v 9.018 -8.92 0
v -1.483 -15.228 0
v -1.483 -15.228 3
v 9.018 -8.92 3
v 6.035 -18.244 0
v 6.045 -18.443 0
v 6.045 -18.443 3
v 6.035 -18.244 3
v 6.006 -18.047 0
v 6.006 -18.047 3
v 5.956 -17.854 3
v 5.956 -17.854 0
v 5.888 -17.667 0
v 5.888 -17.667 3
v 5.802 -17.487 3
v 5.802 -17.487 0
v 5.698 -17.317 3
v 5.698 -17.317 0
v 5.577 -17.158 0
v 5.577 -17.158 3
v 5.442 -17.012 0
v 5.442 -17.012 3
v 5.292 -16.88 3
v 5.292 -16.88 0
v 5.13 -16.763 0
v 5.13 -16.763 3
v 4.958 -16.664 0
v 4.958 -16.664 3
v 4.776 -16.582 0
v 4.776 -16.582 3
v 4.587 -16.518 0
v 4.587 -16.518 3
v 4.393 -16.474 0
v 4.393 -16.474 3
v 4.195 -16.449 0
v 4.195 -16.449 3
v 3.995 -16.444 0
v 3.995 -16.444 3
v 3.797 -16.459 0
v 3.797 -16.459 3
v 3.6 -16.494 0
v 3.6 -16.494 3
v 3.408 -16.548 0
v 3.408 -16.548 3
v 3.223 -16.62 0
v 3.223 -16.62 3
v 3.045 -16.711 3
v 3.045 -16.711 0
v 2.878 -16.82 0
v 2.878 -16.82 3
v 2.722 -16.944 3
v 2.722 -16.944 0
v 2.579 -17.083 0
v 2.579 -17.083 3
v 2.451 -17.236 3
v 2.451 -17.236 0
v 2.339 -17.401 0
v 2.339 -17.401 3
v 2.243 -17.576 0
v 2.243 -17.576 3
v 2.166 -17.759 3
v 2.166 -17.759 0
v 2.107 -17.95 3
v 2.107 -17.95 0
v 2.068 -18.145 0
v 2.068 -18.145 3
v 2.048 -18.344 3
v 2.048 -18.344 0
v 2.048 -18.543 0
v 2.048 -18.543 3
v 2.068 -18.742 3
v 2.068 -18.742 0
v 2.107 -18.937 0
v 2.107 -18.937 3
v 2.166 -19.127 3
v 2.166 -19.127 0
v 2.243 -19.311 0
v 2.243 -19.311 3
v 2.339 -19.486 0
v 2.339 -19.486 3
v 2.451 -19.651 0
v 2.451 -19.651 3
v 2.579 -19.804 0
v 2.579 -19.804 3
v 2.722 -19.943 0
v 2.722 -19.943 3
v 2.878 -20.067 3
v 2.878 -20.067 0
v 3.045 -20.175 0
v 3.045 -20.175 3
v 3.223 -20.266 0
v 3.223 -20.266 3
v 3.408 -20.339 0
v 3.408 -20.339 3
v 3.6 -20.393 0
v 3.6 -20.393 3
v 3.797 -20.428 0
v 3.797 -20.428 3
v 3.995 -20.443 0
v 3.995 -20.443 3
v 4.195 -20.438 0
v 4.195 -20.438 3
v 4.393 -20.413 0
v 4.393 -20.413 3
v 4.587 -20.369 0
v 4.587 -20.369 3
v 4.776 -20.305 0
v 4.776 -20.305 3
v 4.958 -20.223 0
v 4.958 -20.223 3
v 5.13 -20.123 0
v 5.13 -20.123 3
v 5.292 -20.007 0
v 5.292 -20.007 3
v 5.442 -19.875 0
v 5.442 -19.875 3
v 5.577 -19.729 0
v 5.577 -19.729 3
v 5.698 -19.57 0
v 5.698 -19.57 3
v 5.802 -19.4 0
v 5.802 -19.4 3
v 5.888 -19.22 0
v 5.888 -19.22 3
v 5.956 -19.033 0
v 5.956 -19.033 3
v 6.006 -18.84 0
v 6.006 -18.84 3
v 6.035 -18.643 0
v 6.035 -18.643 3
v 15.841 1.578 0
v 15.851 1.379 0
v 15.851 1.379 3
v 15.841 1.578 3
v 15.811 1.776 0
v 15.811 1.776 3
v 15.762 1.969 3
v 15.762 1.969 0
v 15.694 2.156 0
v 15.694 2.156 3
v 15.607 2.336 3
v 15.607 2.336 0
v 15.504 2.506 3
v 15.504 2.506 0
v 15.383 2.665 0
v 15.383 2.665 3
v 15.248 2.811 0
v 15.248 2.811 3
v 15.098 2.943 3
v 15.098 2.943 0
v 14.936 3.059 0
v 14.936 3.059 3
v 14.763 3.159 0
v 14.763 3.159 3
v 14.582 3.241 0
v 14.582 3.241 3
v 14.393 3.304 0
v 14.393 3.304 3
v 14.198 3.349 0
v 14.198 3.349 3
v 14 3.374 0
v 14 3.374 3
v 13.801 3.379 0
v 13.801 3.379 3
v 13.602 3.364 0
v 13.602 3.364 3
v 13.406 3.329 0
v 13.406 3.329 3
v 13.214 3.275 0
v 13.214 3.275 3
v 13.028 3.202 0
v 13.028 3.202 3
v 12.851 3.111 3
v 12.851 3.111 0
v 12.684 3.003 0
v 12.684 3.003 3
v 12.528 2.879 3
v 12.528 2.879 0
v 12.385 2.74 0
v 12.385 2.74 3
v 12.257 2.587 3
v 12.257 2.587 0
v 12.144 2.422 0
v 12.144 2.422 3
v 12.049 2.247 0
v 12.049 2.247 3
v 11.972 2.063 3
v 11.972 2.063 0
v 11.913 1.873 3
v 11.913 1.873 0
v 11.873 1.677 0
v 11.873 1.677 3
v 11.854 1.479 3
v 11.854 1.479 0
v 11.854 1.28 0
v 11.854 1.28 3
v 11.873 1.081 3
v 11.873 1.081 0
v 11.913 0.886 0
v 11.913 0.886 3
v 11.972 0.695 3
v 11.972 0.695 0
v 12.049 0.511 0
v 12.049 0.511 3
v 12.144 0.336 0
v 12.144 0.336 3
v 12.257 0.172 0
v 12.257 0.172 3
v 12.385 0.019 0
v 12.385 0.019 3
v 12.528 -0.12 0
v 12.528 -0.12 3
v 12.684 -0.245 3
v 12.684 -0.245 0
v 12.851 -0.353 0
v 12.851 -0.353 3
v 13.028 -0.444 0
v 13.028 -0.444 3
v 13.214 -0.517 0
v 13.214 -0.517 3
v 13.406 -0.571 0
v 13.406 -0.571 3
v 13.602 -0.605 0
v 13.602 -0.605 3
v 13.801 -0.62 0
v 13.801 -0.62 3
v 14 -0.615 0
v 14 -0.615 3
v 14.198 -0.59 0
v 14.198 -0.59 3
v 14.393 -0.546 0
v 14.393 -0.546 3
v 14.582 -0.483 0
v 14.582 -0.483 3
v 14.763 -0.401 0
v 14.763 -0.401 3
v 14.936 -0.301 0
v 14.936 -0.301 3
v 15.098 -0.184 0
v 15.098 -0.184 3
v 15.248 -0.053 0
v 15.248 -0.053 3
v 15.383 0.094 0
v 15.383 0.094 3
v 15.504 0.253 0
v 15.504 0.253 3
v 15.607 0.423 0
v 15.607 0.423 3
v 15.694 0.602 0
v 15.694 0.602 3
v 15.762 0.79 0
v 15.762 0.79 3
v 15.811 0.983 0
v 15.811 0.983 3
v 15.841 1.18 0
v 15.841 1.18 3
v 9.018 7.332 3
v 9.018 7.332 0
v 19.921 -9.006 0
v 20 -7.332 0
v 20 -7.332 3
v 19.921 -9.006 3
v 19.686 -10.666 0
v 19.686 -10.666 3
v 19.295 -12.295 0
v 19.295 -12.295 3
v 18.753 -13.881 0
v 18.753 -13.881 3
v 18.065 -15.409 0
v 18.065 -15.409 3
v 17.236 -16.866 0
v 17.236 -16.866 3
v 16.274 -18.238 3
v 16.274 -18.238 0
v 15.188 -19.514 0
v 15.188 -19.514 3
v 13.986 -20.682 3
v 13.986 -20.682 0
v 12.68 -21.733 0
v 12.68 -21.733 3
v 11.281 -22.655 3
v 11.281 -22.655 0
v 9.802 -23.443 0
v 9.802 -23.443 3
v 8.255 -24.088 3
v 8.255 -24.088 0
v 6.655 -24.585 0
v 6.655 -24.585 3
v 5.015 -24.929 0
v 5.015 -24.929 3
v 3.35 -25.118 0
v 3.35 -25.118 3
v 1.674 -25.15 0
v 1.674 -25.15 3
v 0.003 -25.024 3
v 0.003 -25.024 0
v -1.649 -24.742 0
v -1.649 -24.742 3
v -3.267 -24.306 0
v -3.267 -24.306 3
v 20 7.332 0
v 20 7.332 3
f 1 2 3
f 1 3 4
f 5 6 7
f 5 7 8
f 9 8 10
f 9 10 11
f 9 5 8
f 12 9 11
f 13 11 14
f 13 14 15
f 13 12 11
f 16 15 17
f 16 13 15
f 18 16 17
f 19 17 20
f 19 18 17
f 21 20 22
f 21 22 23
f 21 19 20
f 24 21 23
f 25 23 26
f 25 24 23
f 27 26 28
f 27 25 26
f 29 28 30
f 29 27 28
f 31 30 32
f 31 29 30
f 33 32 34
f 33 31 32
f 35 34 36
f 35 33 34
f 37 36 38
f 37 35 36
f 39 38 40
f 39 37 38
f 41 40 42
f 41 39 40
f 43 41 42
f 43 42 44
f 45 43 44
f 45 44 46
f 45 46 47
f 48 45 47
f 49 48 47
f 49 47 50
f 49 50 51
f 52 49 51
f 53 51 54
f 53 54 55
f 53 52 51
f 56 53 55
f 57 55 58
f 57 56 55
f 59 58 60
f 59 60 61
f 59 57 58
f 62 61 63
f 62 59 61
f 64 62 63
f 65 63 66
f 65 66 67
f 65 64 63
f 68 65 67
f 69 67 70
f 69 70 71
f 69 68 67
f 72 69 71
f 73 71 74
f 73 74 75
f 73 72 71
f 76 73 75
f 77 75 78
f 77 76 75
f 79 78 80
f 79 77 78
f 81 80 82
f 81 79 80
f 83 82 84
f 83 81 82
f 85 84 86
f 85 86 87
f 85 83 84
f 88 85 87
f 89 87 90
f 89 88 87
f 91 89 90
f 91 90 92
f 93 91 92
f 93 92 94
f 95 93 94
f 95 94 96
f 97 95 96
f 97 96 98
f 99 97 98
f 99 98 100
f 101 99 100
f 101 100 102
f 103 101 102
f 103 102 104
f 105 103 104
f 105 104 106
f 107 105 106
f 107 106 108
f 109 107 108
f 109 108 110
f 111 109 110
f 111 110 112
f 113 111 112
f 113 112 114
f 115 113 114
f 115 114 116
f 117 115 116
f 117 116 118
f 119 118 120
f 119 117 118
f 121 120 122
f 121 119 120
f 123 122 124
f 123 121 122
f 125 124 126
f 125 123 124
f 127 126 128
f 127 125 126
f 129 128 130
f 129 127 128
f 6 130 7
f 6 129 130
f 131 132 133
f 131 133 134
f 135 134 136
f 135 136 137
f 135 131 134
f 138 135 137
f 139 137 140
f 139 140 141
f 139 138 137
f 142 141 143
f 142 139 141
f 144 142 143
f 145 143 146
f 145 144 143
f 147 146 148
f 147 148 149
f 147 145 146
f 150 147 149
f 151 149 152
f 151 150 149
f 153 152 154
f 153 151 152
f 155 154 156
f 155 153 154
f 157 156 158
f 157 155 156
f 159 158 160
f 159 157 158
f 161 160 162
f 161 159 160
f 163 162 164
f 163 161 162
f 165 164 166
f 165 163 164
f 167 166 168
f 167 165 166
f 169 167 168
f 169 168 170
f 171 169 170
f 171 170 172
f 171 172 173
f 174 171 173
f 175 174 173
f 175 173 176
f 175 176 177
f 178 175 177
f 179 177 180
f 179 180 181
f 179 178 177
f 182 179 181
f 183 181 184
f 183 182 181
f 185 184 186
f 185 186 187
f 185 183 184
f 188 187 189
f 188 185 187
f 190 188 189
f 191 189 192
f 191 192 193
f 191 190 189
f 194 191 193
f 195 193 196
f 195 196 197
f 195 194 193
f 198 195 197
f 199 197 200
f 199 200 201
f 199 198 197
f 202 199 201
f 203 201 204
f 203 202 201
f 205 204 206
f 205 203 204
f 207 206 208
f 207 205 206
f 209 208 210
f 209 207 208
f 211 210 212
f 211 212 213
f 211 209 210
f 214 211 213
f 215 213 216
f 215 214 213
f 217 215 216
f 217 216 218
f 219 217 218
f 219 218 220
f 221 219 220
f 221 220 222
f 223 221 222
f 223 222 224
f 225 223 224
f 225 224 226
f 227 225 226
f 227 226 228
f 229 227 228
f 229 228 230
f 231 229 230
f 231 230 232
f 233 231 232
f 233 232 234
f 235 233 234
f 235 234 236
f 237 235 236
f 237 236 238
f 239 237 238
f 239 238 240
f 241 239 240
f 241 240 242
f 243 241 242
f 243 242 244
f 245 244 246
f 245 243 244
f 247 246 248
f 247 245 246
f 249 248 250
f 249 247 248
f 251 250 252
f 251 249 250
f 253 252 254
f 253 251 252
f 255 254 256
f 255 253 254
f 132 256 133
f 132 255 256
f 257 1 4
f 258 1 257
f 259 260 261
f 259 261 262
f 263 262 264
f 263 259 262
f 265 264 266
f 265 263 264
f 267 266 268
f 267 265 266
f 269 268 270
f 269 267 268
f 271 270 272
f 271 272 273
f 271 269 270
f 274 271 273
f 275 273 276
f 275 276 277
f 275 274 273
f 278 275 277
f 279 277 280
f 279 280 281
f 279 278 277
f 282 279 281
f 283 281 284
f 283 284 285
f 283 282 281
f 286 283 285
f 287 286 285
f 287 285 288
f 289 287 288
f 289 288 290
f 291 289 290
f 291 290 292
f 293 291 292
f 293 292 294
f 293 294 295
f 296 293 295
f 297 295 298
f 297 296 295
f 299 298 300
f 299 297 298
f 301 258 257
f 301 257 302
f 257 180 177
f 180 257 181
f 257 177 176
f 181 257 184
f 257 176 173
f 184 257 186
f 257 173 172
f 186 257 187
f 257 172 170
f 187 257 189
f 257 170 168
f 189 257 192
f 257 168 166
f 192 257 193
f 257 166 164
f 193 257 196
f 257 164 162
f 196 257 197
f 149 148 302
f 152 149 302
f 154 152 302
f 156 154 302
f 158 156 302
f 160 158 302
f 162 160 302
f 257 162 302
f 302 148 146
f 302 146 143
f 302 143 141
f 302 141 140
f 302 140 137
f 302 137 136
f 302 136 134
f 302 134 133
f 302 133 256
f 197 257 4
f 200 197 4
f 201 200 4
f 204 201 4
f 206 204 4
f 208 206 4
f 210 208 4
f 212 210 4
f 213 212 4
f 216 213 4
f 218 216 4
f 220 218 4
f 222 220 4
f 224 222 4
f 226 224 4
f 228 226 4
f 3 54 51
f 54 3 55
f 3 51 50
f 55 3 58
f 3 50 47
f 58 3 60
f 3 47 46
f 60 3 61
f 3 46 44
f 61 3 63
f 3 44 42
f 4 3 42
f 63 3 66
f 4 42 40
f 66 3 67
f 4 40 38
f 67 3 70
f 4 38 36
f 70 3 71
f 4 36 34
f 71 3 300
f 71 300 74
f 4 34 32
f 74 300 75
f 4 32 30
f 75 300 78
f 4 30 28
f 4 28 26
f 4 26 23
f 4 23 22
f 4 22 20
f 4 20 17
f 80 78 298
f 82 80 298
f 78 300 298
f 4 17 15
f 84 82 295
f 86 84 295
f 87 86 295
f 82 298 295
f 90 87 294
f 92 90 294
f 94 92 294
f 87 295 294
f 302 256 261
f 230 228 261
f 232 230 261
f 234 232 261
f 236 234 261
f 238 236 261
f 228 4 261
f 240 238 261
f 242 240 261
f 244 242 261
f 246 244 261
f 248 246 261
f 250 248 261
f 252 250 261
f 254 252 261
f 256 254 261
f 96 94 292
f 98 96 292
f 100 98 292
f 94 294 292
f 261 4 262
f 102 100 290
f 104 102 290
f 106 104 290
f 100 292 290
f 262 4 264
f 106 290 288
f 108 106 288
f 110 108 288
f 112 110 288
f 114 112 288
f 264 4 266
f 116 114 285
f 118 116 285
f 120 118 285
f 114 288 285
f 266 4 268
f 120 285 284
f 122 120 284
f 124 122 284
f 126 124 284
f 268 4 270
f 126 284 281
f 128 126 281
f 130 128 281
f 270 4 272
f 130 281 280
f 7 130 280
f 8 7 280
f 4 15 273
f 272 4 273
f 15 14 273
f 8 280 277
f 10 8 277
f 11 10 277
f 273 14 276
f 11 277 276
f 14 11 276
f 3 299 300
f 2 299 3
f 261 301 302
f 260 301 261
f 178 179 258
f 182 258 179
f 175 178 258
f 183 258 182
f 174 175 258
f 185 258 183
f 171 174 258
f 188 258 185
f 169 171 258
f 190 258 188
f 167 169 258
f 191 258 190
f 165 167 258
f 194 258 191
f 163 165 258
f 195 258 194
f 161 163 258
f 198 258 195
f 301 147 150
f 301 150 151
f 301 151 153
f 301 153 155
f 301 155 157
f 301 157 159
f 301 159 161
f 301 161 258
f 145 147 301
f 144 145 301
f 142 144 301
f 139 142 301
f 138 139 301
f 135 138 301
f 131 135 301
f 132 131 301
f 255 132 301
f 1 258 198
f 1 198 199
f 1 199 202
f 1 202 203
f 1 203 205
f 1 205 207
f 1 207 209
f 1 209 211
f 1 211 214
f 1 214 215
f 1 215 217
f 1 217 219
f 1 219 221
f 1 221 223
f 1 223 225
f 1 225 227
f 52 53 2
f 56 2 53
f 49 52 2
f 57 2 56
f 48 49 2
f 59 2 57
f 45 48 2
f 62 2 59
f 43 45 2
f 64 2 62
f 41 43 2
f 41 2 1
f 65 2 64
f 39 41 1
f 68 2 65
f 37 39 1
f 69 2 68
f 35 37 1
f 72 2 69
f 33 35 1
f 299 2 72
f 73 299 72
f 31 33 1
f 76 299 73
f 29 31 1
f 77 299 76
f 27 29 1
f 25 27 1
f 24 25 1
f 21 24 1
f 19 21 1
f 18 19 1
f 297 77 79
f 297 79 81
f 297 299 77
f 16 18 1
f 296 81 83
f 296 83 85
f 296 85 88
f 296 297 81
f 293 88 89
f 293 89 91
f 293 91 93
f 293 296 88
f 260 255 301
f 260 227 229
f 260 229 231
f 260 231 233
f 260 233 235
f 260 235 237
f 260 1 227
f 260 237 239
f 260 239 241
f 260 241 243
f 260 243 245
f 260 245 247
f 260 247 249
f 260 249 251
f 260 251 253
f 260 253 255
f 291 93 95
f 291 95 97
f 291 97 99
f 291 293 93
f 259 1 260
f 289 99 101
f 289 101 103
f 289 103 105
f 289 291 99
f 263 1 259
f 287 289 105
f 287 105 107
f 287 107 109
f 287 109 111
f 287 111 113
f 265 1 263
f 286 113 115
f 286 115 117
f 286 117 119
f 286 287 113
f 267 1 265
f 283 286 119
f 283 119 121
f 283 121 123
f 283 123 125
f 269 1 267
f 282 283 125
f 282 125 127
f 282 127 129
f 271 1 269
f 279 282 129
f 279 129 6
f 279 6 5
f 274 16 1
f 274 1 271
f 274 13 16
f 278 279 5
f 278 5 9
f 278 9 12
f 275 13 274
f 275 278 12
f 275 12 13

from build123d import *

# Parameters (mm, degrees)
SKETCH2_R           = 2
BOSS_EXTRUDE1_DEPTH = 3


with BuildPart() as part:
    # Sketch2 → Boss-Extrude1 (new body)
    with BuildSketch(Plane(origin=(0, 0, 0), x_dir=(-1, 0, 0), z_dir=(0, 0, 1))):
        with BuildLine():
            Line((-9.017950721, -7.332311194), (-20, -7.332311194))
            Line((-20, -7.332311194), (-20, 7.332311194))
            ThreePointArc((-20, 7.332311194), (-12.680293068, 21.732536084), (3.26719031, 24.305930805))
            Line((3.26719031, 24.305930805), (1.482539955, 15.227759845))
            Line((1.482539955, 15.227759845), (-9.017950721, 8.920221357))
            Line((-9.017950721, 8.920221357), (-9.017950721, -7.332311194))
        make_face()
        with Locations(Location((-13.851036571, -1.379219301, 0), (0, 0, 180))):
            Circle(SKETCH2_R, mode=Mode.SUBTRACT)
        with Locations(Location((-4.045326452, 18.443425538, 0), (0, 0, 180))):
            Circle(SKETCH2_R, mode=Mode.SUBTRACT)
    extrude(amount=BOSS_EXTRUDE1_DEPTH)


solid = part.part
